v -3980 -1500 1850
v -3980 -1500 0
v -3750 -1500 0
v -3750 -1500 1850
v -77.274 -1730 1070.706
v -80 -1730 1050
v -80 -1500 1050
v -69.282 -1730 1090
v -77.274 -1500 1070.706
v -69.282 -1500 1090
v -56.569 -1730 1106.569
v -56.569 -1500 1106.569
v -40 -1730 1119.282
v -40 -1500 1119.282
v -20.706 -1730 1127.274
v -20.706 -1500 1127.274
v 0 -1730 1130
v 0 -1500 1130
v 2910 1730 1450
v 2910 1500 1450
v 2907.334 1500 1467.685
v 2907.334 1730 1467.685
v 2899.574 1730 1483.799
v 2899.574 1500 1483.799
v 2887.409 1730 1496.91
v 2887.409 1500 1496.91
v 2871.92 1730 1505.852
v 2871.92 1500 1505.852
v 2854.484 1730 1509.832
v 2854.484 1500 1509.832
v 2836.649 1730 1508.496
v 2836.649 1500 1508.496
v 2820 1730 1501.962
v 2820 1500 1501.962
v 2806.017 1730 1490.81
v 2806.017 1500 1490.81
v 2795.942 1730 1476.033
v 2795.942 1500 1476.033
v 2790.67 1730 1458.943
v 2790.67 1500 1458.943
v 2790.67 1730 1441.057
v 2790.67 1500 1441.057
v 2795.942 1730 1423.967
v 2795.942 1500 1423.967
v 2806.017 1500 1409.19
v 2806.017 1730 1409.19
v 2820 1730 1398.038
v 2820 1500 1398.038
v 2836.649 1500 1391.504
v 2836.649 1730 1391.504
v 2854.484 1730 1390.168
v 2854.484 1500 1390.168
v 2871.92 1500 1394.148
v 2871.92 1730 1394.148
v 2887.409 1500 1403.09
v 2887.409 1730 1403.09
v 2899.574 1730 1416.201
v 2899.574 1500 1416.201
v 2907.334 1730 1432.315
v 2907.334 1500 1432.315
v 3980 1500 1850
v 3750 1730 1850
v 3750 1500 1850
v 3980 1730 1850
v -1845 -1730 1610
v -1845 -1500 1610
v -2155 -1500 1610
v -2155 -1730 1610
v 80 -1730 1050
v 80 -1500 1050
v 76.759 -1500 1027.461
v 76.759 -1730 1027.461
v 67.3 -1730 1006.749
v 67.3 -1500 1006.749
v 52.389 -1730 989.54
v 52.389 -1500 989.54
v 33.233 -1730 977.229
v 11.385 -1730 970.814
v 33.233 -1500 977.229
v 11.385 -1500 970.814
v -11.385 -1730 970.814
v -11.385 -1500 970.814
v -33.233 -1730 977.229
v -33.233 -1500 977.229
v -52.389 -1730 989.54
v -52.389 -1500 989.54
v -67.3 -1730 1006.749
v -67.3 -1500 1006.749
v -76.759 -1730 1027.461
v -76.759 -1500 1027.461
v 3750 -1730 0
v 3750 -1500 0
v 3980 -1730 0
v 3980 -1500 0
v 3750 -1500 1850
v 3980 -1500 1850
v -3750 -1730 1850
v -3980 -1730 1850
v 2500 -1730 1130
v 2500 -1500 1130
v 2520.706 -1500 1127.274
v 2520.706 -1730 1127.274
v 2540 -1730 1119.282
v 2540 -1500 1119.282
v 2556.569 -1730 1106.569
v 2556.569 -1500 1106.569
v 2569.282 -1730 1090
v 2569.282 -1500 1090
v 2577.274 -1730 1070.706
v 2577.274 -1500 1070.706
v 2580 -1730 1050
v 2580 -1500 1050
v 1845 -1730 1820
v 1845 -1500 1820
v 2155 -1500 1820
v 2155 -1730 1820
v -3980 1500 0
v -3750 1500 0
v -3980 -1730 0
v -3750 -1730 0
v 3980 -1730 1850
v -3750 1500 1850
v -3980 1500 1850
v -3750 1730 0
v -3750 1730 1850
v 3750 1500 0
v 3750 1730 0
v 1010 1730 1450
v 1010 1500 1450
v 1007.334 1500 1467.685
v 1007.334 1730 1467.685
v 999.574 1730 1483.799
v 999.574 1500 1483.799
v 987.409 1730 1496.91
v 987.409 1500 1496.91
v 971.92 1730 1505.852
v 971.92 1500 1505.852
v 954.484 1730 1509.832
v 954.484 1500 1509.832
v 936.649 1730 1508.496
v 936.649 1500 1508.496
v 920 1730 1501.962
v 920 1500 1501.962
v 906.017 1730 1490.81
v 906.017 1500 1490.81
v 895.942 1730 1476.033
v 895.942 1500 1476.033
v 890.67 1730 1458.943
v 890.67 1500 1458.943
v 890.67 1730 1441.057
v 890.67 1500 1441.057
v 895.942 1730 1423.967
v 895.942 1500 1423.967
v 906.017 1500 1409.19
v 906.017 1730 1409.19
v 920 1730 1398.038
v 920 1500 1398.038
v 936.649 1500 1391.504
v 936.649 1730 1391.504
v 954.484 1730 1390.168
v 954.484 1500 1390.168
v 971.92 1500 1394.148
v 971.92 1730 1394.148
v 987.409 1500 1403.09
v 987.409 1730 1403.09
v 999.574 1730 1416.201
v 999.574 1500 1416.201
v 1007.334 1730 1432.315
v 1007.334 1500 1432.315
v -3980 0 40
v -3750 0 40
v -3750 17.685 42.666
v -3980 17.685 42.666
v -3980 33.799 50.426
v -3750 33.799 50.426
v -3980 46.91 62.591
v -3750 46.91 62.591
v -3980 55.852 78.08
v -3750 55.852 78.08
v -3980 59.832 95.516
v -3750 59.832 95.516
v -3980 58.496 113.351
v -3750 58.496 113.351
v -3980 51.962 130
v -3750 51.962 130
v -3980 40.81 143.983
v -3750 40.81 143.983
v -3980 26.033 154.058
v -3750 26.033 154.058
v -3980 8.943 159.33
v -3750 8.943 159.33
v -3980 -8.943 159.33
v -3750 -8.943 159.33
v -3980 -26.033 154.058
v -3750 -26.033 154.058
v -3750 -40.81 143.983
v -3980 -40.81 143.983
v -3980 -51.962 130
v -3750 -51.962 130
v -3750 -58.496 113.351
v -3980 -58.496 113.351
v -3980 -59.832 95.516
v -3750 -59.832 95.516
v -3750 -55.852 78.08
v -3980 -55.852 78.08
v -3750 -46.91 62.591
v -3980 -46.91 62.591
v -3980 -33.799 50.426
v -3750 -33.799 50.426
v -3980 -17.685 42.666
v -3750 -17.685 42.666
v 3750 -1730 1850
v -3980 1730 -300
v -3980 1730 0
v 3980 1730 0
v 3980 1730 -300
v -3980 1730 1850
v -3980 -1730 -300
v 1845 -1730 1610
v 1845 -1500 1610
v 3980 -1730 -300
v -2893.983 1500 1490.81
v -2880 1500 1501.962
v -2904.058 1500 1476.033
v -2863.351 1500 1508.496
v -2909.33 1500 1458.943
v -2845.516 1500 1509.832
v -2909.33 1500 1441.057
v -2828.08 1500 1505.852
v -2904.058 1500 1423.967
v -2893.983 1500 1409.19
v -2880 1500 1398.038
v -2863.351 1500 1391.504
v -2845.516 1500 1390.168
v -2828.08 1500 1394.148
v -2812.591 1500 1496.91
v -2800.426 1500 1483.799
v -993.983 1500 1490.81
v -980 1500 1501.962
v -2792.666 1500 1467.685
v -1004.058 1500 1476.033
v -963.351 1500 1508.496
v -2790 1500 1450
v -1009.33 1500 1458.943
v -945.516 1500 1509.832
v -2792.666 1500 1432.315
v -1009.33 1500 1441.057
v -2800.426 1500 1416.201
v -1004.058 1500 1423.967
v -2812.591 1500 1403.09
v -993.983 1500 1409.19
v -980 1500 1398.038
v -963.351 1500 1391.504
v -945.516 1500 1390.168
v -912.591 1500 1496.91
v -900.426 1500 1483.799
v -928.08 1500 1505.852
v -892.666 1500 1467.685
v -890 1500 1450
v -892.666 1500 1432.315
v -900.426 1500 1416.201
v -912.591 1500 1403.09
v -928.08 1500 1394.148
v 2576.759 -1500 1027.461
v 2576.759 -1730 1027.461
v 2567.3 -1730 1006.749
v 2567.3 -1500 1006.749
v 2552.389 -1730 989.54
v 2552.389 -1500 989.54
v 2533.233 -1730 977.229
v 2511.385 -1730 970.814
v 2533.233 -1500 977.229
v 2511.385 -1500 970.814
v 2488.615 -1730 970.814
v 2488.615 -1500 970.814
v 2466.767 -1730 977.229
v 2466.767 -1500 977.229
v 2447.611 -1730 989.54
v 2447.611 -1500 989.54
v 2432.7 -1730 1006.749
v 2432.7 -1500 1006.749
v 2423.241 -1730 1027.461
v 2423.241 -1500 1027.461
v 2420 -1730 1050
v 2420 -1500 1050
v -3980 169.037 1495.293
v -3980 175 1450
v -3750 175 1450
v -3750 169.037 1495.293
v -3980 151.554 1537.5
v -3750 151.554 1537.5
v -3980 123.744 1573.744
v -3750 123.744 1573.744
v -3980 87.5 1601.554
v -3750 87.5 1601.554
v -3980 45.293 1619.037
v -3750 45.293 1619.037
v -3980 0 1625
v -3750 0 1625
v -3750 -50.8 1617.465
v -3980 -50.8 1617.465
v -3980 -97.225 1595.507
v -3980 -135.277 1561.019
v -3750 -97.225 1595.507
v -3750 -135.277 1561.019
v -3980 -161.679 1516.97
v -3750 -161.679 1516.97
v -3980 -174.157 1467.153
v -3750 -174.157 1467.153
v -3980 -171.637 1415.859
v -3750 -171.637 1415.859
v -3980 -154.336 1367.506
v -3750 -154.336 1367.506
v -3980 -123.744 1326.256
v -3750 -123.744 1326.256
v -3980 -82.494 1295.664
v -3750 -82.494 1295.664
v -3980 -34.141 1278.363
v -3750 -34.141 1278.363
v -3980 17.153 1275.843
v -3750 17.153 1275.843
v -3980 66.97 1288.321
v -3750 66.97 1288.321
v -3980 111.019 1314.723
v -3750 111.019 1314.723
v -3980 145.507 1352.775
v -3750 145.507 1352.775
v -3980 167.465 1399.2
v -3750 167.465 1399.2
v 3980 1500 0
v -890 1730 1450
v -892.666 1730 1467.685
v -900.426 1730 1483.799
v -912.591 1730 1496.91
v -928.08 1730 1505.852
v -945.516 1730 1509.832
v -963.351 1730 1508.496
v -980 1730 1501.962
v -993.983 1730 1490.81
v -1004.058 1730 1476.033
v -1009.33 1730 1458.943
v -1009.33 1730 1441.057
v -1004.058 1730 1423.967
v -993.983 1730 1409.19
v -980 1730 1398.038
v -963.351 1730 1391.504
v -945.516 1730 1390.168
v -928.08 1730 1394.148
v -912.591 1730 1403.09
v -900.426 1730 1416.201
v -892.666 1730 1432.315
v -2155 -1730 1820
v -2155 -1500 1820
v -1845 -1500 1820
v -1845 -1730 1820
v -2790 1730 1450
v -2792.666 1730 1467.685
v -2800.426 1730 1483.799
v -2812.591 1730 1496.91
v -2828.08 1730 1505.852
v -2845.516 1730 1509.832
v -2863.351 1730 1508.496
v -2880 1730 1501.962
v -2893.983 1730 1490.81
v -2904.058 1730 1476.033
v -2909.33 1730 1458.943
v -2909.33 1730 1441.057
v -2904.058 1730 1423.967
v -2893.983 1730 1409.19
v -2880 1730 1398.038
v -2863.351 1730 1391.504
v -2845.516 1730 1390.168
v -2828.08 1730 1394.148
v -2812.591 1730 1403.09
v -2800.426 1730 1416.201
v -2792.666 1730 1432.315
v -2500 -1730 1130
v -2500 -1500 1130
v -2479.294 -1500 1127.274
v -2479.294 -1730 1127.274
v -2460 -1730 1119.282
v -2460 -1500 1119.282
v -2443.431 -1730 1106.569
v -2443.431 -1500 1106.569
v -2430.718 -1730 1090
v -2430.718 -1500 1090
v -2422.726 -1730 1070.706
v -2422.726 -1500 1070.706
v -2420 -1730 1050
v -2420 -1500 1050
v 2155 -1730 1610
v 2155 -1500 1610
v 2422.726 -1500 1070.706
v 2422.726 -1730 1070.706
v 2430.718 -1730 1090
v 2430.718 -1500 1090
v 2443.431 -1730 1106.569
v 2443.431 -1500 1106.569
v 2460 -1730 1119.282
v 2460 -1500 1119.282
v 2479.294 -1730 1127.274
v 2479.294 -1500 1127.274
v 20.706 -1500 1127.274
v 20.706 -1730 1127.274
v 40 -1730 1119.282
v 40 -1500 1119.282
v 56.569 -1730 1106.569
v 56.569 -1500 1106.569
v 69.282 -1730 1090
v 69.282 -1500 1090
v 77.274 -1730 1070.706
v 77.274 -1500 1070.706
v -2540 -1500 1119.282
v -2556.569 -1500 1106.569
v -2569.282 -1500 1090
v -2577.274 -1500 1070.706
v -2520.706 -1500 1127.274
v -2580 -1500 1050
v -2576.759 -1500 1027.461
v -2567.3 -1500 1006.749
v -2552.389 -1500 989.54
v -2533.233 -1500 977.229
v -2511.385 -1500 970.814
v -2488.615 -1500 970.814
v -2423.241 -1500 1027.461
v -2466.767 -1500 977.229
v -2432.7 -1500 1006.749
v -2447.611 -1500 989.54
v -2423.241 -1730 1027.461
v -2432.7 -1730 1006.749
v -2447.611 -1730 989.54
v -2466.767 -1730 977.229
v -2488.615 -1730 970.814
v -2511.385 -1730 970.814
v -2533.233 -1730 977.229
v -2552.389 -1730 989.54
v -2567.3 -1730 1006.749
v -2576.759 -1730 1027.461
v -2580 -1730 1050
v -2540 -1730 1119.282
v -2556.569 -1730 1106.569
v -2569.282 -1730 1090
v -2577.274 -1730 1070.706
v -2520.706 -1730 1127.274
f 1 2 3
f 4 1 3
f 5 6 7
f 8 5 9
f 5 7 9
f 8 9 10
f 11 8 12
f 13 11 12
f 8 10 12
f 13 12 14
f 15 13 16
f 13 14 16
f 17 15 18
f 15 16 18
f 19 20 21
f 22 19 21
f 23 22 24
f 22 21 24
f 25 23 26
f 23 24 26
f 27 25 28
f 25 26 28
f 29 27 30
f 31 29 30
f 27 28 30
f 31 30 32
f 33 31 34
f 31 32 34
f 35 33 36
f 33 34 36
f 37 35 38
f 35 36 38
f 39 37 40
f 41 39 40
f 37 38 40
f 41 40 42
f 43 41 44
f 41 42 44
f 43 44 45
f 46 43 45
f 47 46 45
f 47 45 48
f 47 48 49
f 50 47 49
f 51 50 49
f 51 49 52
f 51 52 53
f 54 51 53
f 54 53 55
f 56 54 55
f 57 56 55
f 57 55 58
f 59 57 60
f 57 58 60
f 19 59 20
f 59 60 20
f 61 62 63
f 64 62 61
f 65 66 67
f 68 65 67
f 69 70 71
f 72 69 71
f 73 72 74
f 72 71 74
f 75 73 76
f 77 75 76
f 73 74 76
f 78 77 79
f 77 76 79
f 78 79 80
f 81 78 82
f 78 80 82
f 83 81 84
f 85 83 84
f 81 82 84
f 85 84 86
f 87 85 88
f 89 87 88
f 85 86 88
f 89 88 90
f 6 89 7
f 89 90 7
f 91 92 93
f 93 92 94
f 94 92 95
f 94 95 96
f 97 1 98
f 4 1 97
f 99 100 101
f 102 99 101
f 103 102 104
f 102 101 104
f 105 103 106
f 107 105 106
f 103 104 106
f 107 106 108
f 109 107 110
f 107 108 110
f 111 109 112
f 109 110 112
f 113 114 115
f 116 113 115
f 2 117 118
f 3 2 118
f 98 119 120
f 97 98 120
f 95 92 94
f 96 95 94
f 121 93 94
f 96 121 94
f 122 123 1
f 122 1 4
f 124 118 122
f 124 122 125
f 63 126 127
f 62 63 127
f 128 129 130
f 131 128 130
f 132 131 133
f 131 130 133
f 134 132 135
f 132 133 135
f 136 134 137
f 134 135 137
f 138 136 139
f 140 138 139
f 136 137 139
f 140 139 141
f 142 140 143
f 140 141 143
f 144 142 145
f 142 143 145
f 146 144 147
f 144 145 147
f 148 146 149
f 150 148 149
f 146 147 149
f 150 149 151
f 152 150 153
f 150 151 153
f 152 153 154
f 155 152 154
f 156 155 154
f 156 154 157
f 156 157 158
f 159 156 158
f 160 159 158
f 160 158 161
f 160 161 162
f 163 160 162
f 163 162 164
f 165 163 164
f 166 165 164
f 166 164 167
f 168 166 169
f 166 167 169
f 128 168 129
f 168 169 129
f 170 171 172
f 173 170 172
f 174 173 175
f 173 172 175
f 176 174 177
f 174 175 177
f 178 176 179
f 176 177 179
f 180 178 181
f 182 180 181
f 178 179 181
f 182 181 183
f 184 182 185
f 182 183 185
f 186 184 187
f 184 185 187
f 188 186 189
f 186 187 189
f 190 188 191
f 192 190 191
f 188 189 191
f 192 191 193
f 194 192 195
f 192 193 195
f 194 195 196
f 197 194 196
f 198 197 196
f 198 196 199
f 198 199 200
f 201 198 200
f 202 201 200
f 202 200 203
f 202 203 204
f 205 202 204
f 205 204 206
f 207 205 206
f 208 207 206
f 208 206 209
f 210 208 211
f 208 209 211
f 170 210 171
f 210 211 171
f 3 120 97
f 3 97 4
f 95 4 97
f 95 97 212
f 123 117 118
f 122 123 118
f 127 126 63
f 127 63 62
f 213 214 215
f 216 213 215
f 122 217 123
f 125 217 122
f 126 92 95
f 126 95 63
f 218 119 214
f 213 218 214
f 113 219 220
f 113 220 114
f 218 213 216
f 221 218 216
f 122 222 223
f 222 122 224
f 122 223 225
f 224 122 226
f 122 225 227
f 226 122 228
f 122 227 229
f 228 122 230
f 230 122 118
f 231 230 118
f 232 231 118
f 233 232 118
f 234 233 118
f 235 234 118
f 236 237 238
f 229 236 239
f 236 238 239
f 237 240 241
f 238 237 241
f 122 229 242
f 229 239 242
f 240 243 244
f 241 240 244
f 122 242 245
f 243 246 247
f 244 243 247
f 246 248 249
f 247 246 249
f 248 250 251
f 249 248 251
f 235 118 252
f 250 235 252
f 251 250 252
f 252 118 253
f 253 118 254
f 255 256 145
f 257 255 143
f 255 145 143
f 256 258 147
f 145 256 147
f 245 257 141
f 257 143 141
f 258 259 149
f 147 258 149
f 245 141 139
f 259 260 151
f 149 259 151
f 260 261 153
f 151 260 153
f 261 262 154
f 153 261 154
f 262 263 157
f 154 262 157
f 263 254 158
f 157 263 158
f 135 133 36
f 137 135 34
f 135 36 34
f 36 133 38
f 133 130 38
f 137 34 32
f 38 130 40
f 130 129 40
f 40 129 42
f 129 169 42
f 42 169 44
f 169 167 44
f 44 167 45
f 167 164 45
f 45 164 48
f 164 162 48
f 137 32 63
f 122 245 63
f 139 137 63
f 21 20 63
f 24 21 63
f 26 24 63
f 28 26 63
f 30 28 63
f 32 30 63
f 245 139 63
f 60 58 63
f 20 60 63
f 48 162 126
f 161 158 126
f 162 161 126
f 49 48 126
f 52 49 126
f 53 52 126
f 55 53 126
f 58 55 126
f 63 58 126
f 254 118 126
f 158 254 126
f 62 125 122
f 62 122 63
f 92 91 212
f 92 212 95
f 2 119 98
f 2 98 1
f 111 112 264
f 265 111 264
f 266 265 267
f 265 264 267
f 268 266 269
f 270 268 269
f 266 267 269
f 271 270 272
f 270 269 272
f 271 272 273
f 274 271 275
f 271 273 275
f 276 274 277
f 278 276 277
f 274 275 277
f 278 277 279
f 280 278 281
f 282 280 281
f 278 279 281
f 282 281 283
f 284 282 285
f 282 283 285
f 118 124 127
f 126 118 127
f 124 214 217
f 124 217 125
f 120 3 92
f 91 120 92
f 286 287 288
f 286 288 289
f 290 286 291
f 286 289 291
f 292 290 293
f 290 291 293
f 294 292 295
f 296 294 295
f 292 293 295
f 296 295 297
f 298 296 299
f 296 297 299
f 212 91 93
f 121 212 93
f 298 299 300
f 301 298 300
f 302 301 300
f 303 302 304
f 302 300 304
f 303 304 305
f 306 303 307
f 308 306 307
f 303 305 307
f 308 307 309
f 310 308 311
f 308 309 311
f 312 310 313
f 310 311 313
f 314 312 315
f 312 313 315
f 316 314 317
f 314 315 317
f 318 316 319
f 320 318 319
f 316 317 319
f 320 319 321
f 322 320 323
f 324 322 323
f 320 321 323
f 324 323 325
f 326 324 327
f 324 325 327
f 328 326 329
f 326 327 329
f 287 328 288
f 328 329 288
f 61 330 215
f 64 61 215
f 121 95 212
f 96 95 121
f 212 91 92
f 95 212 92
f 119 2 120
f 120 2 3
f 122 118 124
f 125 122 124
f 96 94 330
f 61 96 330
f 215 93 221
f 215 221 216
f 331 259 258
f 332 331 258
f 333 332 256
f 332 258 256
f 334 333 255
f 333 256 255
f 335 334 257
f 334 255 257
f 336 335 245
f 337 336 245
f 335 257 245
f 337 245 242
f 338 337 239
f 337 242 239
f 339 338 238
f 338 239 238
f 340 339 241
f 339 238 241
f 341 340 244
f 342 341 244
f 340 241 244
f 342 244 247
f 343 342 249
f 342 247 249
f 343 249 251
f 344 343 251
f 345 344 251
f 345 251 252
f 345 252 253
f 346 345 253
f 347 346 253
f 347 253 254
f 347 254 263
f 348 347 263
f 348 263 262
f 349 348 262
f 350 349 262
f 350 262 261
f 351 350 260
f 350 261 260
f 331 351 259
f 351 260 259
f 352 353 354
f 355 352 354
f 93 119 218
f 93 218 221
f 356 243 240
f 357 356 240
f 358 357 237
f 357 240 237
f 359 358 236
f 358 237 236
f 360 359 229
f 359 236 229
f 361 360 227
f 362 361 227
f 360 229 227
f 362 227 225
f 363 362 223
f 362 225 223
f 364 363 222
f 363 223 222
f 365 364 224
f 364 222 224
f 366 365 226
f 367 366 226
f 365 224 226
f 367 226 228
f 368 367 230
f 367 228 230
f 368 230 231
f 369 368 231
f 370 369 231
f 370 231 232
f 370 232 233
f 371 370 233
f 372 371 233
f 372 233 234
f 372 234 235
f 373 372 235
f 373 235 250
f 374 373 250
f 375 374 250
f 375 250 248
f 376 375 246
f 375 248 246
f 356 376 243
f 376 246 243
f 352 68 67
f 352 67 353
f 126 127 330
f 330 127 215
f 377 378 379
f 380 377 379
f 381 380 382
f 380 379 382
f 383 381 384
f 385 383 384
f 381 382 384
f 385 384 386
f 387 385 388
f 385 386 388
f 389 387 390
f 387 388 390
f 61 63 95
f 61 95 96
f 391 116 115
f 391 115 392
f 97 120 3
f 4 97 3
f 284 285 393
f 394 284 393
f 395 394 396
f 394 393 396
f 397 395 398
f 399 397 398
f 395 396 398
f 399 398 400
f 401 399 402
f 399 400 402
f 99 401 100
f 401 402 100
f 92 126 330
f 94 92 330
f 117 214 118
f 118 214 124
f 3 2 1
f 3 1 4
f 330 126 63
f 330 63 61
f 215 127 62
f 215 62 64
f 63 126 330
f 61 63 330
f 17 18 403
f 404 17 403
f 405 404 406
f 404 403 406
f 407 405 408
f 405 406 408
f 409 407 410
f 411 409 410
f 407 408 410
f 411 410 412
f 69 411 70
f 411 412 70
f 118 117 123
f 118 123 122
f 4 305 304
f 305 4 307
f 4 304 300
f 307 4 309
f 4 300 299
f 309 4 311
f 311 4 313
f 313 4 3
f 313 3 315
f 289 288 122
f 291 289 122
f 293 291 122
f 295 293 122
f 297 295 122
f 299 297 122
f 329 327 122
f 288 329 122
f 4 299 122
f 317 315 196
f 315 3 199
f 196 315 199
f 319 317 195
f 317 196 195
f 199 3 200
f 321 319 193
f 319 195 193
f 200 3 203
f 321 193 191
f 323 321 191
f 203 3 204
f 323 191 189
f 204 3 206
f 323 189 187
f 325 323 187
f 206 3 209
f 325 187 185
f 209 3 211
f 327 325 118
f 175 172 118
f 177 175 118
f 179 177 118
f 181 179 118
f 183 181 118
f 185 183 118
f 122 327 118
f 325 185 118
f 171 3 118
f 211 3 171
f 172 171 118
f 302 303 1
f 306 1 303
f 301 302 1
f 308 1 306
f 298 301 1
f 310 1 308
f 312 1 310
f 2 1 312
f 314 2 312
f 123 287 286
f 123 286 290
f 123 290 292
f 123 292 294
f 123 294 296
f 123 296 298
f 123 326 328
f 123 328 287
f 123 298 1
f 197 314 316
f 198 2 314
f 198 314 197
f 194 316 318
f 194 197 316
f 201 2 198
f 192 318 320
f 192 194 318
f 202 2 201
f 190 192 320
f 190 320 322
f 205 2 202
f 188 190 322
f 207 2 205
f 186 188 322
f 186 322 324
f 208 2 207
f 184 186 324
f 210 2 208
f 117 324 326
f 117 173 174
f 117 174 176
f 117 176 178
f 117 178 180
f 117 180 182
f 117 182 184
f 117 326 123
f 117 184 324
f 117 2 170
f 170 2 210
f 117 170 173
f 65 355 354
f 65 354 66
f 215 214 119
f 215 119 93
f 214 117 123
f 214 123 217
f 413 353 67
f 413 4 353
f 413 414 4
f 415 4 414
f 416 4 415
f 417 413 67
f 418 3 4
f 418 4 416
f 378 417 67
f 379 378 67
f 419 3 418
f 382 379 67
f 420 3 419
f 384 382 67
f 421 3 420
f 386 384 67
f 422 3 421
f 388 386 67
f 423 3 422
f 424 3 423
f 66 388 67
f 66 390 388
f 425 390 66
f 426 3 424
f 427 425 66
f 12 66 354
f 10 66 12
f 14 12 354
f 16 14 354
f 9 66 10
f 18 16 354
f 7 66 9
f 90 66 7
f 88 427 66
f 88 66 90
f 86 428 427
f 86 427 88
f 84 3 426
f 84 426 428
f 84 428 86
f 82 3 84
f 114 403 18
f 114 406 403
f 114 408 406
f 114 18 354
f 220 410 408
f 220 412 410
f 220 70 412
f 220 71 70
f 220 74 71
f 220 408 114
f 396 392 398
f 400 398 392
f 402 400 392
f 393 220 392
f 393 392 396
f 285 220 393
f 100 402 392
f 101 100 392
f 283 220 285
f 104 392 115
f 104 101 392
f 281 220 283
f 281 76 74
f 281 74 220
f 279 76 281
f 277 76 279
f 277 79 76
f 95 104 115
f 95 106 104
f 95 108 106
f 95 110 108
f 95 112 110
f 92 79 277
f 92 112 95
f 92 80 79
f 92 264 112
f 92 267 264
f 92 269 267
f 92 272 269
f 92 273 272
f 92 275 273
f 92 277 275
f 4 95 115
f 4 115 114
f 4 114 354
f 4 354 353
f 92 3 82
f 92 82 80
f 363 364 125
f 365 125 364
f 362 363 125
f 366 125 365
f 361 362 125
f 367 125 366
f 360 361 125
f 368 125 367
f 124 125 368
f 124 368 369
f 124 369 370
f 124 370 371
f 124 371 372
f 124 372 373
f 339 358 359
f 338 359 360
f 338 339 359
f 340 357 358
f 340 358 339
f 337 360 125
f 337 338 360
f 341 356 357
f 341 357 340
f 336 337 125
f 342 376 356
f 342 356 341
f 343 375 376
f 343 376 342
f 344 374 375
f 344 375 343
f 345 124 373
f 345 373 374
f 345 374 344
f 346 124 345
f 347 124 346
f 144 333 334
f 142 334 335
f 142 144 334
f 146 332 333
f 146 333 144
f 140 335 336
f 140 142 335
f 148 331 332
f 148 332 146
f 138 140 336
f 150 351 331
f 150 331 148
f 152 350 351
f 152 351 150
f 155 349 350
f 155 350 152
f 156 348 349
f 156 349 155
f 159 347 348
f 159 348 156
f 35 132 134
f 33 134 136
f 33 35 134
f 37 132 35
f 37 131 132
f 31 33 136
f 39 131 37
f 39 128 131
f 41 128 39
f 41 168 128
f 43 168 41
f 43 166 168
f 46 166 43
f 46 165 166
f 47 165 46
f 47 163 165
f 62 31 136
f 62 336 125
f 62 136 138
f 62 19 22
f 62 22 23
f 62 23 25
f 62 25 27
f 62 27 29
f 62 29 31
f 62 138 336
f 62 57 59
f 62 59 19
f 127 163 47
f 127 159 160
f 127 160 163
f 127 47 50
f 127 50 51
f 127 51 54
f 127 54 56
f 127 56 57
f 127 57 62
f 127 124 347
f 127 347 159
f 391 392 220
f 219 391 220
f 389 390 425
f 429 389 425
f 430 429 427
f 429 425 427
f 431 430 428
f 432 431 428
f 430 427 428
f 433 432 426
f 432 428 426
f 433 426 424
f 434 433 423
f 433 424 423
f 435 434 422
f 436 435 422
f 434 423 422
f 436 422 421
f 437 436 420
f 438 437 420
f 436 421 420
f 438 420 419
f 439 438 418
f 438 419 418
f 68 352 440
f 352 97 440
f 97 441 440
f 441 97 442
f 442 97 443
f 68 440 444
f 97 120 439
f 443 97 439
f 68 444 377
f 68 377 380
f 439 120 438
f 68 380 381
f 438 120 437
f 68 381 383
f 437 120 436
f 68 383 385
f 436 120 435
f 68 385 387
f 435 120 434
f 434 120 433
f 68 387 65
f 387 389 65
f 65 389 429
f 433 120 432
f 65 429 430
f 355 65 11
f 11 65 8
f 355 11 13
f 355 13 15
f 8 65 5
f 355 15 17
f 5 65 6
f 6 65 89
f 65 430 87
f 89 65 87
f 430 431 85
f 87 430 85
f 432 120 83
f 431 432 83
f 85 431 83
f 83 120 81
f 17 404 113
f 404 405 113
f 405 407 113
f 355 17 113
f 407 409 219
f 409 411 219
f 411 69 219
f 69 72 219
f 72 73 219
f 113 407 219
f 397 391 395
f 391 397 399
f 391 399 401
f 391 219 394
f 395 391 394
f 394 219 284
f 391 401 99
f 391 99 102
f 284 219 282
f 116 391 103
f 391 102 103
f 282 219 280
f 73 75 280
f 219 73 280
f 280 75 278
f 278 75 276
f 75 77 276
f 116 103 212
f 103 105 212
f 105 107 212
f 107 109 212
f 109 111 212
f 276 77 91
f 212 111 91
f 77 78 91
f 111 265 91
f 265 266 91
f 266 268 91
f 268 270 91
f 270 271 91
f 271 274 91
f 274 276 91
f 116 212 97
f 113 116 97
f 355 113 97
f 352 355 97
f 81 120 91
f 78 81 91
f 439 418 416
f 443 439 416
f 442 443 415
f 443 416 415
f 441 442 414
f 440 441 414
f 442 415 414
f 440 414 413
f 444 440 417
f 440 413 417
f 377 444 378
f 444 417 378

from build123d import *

# Parameters (mm, degrees)
F0_W      = 7960
F0_H      = 3460
F1_DEPTH  = 300
F2_W      = 230
F2_H      = 3000
F3_DEPTH  = 1850
F2_W_2    = 7500
F2_H_2    = 230
F4_DEPTH  = 1850
F6_DEPTH  = 230
F8_DEPTH  = 230
F7_W      = 155
F7_H      = 105
F9_DEPTH  = 230
F11_DEPTH = 230


with BuildPart() as f1:
    # F0 (on Top) → F1 (new body)
    with BuildSketch(Plane.XY):
        Rectangle(F0_W, F0_H)
    extrude(amount=-F1_DEPTH)


with BuildPart() as f3:
    # F2 (on face) → F3 (new body)
    with BuildSketch(Plane.XY):
        with Locations((-3865, 0)):
            Rectangle(F2_W, F2_H)
    extrude(amount=F3_DEPTH)

    # F10 (on face) → F11 (cut)
    with BuildSketch(Plane.YZ.offset(-3750)):
        with BuildLine():
            Line((0, 100), (60, 100))
            ThreePointArc((60, 100), (-42.4264068712, 142.4264068712), (0, 40))
            Line((0, 40), (0, 100))
        make_face()
        with BuildLine():
            ThreePointArc((0, 40), (42.4264068712, 57.5735931288), (60, 100))
            Line((60, 100), (0, 100))
            Line((0, 100), (0, 40))
        make_face()
        with BuildLine():
            Line((0, 1450), (0, 1625))
            ThreePointArc((0, 1625), (-123.7436867076, 1326.2563132924), (175, 1450))
            Line((175, 1450), (0, 1450))
        make_face()
        with BuildLine():
            ThreePointArc((175, 1450), (123.7436867076, 1573.7436867076), (0, 1625))
            Line((0, 1625), (0, 1450))
            Line((0, 1450), (175, 1450))
        make_face()
    extrude(amount=-F11_DEPTH, mode=Mode.SUBTRACT)


with BuildPart() as f3b:
    # F2 (on face) → F3, piece 2 (new body)
    with BuildSketch(Plane.XY):
        with Locations((3865, 0)):
            Rectangle(F2_W, F2_H)
    extrude(amount=F3_DEPTH)


with BuildPart() as f3c:
    # F2 (on face) → F3, piece 3 (new body)
    with BuildSketch(Plane.XY):
        with Locations((0, 1615)):
            Rectangle(F2_W_2, F2_H_2)
    extrude(amount=F3_DEPTH)

    # F5 (on face) → F6 (cut)
    with BuildSketch(Plane.XZ.offset(-1500)):
        with BuildLine():
            Line((-2850, 1450), (-2910, 1450))
            ThreePointArc((-2910, 1450), (-2850, 1390), (-2790, 1450))
            Line((-2790, 1450), (-2850, 1450))
        make_face()
        with BuildLine():
            Line((-2850, 1450), (-2850, 1510))
            ThreePointArc((-2850, 1510), (-2892.4264068712, 1492.4264068712), (-2910, 1450))
            Line((-2910, 1450), (-2850, 1450))
        make_face()
        with BuildLine():
            ThreePointArc((-2790, 1450), (-2807.5735931288, 1492.4264068712), (-2850, 1510))
            Line((-2850, 1510), (-2850, 1450))
            Line((-2850, 1450), (-2790, 1450))
        make_face()
        with BuildLine():
            Line((-950, 1450), (-1010, 1450))
            ThreePointArc((-1010, 1450), (-950, 1390), (-890, 1450))
            Line((-890, 1450), (-950, 1450))
        make_face()
        with BuildLine():
            Line((-950, 1450), (-950, 1510))
            ThreePointArc((-950, 1510), (-992.4264068712, 1492.4264068712), (-1010, 1450))
            Line((-1010, 1450), (-950, 1450))
        make_face()
        with BuildLine():
            ThreePointArc((-890, 1450), (-907.5735931288, 1492.4264068712), (-950, 1510))
            Line((-950, 1510), (-950, 1450))
            Line((-950, 1450), (-890, 1450))
        make_face()
        with BuildLine():
            Line((950, 1450), (890, 1450))
            ThreePointArc((890, 1450), (950, 1390), (1010, 1450))
            Line((1010, 1450), (950, 1450))
        make_face()
        with BuildLine():
            Line((950, 1450), (950, 1510))
            ThreePointArc((950, 1510), (907.5735931288, 1492.4264068712), (890, 1450))
            Line((890, 1450), (950, 1450))
        make_face()
        with BuildLine():
            ThreePointArc((1010, 1450), (992.4264068712, 1492.4264068712), (950, 1510))
            Line((950, 1510), (950, 1450))
            Line((950, 1450), (1010, 1450))
        make_face()
        with BuildLine():
            ThreePointArc((2790, 1450), (2850, 1390), (2910, 1450))
            Line((2910, 1450), (2850, 1450))
            Line((2850, 1450), (2790, 1450))
        make_face()
        with BuildLine():
            Line((2850, 1450), (2850, 1510))
            ThreePointArc((2850, 1510), (2807.5735931288, 1492.4264068712), (2790, 1450))
            Line((2790, 1450), (2850, 1450))
        make_face()
        with BuildLine():
            ThreePointArc((2910, 1450), (2892.4264068712, 1492.4264068712), (2850, 1510))
            Line((2850, 1510), (2850, 1450))
            Line((2850, 1450), (2910, 1450))
        make_face()
    extrude(amount=-F6_DEPTH, mode=Mode.SUBTRACT)


with BuildPart() as f3d:
    # F2 (on face) → F3, piece 4 (new body)
    with BuildSketch(Plane.XY):
        with Locations((0, -1615)):
            Rectangle(F2_W_2, F2_H_2)
    extrude(amount=F3_DEPTH)

    # F7 (on face) → F8 (cut)
    with BuildSketch(Plane(origin=(0, -1500, 0), x_dir=(-1, 0, 0), z_dir=(0, 1, 0))):
        with BuildLine():
            Line((-2500, 1050), (-2500, 1130))
            ThreePointArc((-2500, 1130), (-2556.5685424949, 1106.5685424949), (-2580, 1050))
            Line((-2580, 1050), (-2500, 1050))
        make_face()
        with BuildLine():
            ThreePointArc((-2420, 1050), (-2443.4314575051, 1106.5685424949), (-2500, 1130))
            Line((-2500, 1130), (-2500, 1050))
            Line((-2500, 1050), (-2420, 1050))
        make_face()
        with BuildLine():
            Line((-2500, 1050), (-2580, 1050))
            ThreePointArc((-2580, 1050), (-2500, 970), (-2420, 1050))
            Line((-2420, 1050), (-2500, 1050))
        make_face()
        with BuildLine():
            Line((0, 1050), (0, 1130))
            ThreePointArc((0, 1130), (-56.5685424949, 1106.5685424949), (-80, 1050))
            Line((-80, 1050), (0, 1050))
        make_face()
        with BuildLine():
            Line((0, 1050), (-80, 1050))
            ThreePointArc((-80, 1050), (0, 970), (80, 1050))
            Line((80, 1050), (0, 1050))
        make_face()
        with BuildLine():
            ThreePointArc((80, 1050), (56.5685424949, 1106.5685424949), (0, 1130))
            Line((0, 1130), (0, 1050))
            Line((0, 1050), (80, 1050))
        make_face()
        with BuildLine():
            Line((2500, 1050), (2420, 1050))
            ThreePointArc((2420, 1050), (2500, 970), (2580, 1050))
            Line((2580, 1050), (2500, 1050))
        make_face()
        with BuildLine():
            ThreePointArc((2500, 1130), (2443.4314575051, 1106.5685424949), (2420, 1050))
            Line((2420, 1050), (2500, 1050))
            Line((2500, 1050), (2500, 1130))
        make_face()
        with BuildLine():
            Line((2500, 1050), (2580, 1050))
            ThreePointArc((2580, 1050), (2556.5685424949, 1106.5685424949), (2500, 1130))
            Line((2500, 1130), (2500, 1050))
        make_face()
    extrude(amount=-F8_DEPTH, mode=Mode.SUBTRACT)

    # F7 (on face) → F9 (cut)
    with BuildSketch(Plane(origin=(0, -1500, 0), x_dir=(-1, 0, 0), z_dir=(0, 1, 0))):
        Polygon((2000, 1715), (2000, 1820), (1845, 1820), (1845, 1610), (2155, 1610), (2155, 1715), align=None)
        with Locations((2077.5, 1767.5)):
            Rectangle(F7_W, F7_H)
        Polygon((-2000, 1715), (-2155, 1715), (-2155, 1610), (-1845, 1610), (-1845, 1820), (-2000, 1820), align=None)
        with Locations((-2077.5, 1767.5)):
            Rectangle(F7_W, F7_H)
    extrude(amount=-F9_DEPTH, mode=Mode.SUBTRACT)


with BuildPart() as f4:
    # F2 (on face) → F4 (new body)
    with BuildSketch(Plane.XY):
        with Locations((-3865, -1615)):
            Rectangle(F2_W, F2_H_2)
    extrude(amount=F4_DEPTH)


with BuildPart() as f4b:
    # F2 (on face) → F4, piece 2 (new body)
    with BuildSketch(Plane.XY):
        with Locations((-3865, 1615)):
            Rectangle(F2_W, F2_H_2)
    extrude(amount=F4_DEPTH)


with BuildPart() as f4c:
    # F2 (on face) → F4, piece 3 (new body)
    with BuildSketch(Plane.XY):
        with Locations((3865, 1615)):
            Rectangle(F2_W, F2_H_2)
    extrude(amount=F4_DEPTH)


with BuildPart() as f4d:
    # F2 (on face) → F4, piece 4 (new body)
    with BuildSketch(Plane.XY):
        with Locations((3865, -1615)):
            Rectangle(F2_W, F2_H_2)
    extrude(amount=F4_DEPTH)


solid = Compound([f1.part, f3.part, f3b.part, f3c.part, f3d.part, f4.part, f4b.part, f4c.part, f4d.part])
